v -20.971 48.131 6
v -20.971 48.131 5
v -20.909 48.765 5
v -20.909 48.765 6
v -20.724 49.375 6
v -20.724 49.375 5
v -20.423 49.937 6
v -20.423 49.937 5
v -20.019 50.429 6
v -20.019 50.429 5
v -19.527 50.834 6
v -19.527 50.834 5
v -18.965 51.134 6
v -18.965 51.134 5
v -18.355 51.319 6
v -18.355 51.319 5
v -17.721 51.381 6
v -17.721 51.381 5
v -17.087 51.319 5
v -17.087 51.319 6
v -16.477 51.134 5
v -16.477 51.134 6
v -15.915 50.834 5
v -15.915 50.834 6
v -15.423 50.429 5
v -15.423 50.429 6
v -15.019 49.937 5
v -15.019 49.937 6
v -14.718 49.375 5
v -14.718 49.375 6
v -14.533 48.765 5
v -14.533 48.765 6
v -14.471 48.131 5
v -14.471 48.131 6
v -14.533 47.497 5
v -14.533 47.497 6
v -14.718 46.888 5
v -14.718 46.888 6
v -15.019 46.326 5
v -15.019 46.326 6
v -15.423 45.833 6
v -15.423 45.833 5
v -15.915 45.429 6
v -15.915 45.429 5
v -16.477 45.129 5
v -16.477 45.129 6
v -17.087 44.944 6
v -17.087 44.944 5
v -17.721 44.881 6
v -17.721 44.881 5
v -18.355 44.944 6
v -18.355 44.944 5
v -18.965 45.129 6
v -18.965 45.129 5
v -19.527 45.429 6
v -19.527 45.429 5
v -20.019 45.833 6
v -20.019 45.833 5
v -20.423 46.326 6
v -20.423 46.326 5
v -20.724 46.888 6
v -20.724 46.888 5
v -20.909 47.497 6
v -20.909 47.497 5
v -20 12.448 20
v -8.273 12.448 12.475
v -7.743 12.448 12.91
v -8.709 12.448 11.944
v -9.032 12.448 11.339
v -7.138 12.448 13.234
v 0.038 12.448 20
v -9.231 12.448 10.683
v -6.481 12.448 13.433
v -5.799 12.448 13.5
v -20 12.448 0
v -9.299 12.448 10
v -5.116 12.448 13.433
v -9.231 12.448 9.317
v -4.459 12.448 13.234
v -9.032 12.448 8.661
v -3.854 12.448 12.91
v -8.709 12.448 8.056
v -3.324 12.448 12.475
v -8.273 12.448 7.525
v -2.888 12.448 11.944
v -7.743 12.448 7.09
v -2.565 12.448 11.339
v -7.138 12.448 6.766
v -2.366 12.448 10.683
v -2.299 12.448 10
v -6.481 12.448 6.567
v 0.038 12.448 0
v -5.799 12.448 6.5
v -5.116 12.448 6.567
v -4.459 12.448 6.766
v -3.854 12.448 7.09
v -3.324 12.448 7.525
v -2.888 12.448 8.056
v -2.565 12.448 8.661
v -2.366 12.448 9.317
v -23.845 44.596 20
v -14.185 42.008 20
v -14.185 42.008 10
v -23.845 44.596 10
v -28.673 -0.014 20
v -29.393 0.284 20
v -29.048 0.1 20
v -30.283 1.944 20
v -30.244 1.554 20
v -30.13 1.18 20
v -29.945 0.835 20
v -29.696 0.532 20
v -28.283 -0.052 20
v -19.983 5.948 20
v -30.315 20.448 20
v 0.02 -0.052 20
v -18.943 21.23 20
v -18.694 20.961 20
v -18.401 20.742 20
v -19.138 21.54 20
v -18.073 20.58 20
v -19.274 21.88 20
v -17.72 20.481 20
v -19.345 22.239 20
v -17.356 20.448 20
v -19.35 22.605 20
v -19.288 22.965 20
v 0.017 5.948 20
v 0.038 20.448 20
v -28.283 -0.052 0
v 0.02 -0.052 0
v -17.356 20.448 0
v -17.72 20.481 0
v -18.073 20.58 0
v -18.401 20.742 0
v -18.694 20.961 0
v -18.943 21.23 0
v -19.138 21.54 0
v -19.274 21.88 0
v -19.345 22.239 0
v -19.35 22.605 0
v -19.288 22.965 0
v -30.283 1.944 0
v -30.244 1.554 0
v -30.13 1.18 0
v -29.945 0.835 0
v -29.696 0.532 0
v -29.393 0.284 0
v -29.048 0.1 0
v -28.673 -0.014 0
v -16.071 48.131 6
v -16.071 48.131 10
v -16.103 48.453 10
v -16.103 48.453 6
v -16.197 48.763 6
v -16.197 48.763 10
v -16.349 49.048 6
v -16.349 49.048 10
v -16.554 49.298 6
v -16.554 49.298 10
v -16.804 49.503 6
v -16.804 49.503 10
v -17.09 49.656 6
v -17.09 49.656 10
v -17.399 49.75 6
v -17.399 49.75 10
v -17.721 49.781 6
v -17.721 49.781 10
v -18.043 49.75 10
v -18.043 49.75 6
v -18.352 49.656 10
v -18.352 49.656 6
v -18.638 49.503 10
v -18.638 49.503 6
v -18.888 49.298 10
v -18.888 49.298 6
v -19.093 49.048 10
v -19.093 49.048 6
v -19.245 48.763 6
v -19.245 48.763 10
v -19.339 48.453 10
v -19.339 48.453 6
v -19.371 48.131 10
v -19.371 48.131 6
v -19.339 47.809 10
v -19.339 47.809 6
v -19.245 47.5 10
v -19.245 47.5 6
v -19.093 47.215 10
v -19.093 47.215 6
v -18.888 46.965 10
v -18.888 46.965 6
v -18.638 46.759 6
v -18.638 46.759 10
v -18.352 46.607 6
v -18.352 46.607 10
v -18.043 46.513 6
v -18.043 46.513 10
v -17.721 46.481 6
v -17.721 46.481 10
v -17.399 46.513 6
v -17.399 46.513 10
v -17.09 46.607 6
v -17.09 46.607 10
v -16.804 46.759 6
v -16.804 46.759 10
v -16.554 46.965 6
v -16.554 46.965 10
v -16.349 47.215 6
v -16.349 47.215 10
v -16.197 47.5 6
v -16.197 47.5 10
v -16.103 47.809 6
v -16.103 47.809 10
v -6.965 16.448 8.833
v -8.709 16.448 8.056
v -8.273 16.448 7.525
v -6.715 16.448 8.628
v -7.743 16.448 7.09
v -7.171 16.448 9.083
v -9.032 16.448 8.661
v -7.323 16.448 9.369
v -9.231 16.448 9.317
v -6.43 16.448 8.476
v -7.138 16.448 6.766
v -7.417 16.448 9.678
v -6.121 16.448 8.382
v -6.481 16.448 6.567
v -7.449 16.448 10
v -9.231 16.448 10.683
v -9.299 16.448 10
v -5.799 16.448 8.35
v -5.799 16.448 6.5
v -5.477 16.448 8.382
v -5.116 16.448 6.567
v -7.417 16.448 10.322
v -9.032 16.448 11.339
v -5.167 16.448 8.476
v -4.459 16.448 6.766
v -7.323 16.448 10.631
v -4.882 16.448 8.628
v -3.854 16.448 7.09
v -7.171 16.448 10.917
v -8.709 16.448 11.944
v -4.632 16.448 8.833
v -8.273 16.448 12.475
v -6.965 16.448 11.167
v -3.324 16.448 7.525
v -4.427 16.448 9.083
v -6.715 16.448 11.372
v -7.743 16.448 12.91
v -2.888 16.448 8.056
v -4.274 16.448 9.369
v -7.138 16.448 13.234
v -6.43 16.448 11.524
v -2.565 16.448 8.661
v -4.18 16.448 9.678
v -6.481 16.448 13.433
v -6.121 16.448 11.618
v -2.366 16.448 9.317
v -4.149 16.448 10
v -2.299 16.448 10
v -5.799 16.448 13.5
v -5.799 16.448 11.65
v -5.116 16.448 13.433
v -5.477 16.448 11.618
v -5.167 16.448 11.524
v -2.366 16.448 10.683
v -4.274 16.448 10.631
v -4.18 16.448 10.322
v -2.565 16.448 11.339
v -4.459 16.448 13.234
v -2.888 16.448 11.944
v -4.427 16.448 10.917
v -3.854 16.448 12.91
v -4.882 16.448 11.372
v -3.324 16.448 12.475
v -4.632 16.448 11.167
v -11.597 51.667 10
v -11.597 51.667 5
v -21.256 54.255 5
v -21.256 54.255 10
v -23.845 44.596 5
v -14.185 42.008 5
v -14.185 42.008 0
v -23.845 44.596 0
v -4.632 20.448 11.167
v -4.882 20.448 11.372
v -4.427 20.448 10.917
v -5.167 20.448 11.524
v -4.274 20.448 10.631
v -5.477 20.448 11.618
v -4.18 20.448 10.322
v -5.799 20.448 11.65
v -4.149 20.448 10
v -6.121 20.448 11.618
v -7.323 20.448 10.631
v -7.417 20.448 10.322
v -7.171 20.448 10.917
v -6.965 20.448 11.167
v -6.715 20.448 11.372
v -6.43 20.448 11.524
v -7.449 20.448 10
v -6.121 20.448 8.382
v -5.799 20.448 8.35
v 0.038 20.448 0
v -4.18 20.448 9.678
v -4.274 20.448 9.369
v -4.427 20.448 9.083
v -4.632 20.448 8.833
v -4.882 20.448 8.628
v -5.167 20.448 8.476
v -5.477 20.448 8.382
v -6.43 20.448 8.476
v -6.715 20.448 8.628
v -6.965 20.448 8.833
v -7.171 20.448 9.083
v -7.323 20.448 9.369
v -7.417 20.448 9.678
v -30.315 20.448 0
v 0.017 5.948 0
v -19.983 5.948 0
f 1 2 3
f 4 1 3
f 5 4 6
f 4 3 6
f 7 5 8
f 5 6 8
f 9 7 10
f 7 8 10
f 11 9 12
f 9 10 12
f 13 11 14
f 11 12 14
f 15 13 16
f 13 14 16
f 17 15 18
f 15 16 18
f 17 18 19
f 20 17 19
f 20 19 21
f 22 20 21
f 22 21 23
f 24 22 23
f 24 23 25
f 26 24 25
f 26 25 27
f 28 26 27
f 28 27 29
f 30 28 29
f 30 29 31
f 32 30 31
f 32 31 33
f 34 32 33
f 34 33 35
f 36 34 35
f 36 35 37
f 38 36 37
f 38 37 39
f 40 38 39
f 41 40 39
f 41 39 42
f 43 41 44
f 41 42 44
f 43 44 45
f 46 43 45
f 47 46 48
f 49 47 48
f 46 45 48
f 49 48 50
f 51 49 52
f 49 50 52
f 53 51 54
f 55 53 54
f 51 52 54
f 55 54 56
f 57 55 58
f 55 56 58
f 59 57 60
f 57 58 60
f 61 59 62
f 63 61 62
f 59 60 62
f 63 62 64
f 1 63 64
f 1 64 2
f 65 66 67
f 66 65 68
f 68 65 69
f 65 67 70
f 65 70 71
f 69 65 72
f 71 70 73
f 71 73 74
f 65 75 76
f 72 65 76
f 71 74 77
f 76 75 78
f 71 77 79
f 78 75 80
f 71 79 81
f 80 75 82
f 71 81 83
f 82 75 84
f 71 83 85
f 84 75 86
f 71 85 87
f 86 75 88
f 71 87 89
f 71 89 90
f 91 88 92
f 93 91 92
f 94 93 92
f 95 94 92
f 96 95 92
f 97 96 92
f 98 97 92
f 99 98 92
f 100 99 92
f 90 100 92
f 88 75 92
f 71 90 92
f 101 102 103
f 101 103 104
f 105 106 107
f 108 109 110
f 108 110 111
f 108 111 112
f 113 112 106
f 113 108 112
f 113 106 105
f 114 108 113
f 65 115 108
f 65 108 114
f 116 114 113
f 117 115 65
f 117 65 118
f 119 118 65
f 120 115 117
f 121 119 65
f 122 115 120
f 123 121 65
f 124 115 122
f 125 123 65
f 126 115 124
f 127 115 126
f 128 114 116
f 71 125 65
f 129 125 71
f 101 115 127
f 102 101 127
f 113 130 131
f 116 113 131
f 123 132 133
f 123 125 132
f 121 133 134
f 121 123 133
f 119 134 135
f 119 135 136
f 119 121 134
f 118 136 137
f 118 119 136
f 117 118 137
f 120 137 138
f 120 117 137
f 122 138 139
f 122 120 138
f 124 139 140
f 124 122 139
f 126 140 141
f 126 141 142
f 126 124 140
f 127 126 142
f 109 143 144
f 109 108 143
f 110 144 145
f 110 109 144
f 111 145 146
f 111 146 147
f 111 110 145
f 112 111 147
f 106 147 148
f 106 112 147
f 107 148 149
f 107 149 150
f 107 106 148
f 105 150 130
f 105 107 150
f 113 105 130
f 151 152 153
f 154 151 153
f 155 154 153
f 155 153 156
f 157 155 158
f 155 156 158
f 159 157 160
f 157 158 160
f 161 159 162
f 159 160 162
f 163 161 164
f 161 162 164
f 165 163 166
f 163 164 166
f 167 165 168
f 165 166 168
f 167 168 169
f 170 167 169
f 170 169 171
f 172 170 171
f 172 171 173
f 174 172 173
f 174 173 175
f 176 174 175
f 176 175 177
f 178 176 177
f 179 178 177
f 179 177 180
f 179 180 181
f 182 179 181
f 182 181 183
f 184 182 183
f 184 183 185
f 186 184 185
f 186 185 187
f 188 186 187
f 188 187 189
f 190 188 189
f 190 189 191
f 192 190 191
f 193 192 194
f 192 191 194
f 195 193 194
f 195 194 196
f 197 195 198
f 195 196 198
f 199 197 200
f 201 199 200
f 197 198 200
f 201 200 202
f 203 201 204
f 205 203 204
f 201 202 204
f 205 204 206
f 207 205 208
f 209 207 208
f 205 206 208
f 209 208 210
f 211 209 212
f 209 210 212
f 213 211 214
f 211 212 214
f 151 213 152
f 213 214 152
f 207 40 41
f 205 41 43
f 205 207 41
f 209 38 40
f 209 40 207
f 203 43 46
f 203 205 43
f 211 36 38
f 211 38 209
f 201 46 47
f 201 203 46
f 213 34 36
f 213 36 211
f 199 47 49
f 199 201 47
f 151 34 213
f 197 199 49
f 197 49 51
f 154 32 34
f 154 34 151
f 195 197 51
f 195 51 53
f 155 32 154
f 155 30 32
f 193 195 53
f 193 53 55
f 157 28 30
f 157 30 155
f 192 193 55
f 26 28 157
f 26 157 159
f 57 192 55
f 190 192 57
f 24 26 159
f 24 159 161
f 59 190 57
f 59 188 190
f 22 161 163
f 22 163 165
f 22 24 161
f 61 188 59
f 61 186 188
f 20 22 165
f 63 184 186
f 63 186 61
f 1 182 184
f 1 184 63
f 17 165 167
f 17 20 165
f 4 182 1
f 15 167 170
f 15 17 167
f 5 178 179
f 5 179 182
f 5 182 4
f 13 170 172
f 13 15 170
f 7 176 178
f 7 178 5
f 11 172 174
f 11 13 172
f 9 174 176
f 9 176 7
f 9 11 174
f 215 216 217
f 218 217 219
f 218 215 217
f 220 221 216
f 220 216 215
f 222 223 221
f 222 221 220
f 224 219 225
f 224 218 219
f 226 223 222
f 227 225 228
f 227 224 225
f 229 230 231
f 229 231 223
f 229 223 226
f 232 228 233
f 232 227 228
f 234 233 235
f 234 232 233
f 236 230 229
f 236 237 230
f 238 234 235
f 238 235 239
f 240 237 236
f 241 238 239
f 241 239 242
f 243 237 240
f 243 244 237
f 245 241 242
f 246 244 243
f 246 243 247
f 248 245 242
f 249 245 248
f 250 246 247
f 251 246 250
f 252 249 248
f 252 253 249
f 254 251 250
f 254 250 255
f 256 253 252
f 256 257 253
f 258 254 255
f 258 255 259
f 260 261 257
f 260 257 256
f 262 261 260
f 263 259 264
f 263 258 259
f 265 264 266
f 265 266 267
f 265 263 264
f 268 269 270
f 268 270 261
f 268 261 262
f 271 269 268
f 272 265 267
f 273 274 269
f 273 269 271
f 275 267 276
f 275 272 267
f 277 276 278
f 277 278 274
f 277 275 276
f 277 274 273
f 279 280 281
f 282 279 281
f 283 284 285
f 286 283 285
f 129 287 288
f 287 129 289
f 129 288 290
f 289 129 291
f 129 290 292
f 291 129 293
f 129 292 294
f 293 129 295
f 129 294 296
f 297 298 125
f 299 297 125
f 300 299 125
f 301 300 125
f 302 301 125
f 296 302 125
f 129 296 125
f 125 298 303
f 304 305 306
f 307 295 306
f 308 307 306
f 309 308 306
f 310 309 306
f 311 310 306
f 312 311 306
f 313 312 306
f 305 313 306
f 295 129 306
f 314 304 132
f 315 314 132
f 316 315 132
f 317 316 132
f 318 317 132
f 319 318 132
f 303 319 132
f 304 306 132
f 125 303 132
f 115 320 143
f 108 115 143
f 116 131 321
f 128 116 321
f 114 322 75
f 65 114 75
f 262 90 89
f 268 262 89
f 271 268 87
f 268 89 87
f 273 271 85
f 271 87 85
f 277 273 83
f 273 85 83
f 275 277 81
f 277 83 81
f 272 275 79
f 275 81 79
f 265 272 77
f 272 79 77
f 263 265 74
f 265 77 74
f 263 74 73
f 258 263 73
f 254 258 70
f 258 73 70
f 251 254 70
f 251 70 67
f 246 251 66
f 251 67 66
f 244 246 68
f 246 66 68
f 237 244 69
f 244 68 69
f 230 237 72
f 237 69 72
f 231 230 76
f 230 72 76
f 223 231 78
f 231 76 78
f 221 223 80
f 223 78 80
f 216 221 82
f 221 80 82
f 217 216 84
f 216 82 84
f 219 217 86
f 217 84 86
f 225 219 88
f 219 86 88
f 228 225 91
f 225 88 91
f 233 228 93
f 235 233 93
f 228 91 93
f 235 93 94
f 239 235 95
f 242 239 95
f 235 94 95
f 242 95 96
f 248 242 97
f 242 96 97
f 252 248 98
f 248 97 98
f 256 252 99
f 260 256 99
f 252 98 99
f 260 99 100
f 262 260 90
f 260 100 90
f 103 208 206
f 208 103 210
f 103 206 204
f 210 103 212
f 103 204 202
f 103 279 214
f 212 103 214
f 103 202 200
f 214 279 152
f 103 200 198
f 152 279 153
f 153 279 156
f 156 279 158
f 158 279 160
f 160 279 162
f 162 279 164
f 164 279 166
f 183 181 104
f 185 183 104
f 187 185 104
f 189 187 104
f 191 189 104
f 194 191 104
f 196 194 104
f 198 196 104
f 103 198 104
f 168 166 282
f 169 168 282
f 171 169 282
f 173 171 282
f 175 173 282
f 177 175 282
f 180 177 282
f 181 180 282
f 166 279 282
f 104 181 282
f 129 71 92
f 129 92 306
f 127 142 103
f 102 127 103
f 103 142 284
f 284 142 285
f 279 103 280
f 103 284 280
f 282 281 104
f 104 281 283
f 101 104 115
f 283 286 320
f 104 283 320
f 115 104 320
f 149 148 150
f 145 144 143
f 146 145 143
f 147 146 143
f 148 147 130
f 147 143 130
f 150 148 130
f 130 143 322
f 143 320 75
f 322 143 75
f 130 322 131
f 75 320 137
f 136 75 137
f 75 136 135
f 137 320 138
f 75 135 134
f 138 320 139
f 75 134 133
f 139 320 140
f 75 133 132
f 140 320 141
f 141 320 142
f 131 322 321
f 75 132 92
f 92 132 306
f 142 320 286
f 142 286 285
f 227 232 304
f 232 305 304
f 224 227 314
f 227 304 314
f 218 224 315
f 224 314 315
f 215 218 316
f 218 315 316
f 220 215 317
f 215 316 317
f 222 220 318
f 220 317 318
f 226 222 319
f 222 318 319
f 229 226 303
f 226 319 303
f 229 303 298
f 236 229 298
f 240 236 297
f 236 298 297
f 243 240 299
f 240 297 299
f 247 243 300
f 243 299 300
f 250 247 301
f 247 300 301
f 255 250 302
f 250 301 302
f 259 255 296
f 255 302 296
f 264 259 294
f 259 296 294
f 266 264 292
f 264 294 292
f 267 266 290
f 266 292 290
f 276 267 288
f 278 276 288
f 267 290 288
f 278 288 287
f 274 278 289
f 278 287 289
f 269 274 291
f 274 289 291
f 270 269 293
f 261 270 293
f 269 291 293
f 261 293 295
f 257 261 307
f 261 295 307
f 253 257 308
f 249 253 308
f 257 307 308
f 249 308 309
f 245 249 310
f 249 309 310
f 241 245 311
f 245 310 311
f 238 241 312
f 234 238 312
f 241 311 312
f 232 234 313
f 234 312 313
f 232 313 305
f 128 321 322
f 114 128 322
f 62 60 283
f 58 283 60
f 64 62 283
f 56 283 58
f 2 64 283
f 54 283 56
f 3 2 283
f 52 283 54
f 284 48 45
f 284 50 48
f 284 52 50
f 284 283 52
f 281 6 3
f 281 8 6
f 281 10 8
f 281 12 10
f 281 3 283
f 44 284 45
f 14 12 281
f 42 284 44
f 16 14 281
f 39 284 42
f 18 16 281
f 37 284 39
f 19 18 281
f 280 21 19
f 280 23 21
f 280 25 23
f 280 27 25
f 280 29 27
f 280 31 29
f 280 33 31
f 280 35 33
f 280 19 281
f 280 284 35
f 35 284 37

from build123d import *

# Parameters (mm, degrees)
EXTRUDE_1_DEPTH        = 20
FILLET_1_R             = 2
FILLET_2_R             = 2
SKETCH_30_W            = 1.65
SKETCH_30_H            = 8
SKETCH_31_R            = 3.5
CUT_EXTRUDE_1_DEPTH    = 4
CUT_EXTRUDE_2_DEPTH    = 10
SKETCH_34_R            = 3.25
CUT_EXTRUDE_3_DEPTH    = 6
HOLE_WIZARD_M4_2_D     = 3.3
HOLE_WIZARD_M4_2_DEPTH = 4
SKETCH_38_W            = 5
SKETCH_38_H            = 10
CUT_EXTRUDE_4_DEPTH    = 11


with BuildPart() as part:
    # 草图1 → 凸台-拉伸1 (new body)
    with BuildSketch(Plane.XY):
        Polygon((0.020144186, -0.052366179), (0.016918395, 5.947632954), (-19.983081605, 5.947632954), (-20.000068427, 12.447632954), (0.03759791, 12.447632954), (0.03759791, 20.447632954), (-19.96240209, 20.447632954), (-11.597239053, 51.666846423), (-21.256497316, 54.255036874), (-30.315163894, 20.447632954), (-30.279663837, -0.052366179), align=None)
    extrude(amount=EXTRUDE_1_DEPTH)

    # 圆角1
    fillet_1_edges = [part.edges().sort_by_distance(p)[0] for p in [
        (-19.96240209, 20.447632954, 10),
    ]]
    fillet(fillet_1_edges, radius=FILLET_1_R)

    # 圆角2
    fillet_2_edges = [part.edges().sort_by_distance(p)[0] for p in [
        (-30.279663837, -0.052366179, 10),
    ]]
    fillet(fillet_2_edges, radius=FILLET_2_R)

    # 草图30 → M4 螺纹孔的螺纹孔钻头1 (revolve, cut)
    with BuildSketch(Plane(origin=(-5.798619526, 12.447632954, 10), x_dir=(0, 0, -1), z_dir=(1, 0, 0))):
        with Locations((0.825, 4)):
            Rectangle(SKETCH_30_W, SKETCH_30_H)
    revolve(axis=Axis((-5.798619526, 6.097632954, 10), (0, 1, 0)), mode=Mode.SUBTRACT)

    # 草图31 → 切除-拉伸1 (cut)
    with BuildSketch(Plane.XZ.offset(-12.447632954)):
        with Locations((-5.798619526, 10)):
            Circle(SKETCH_31_R)
    extrude(amount=-CUT_EXTRUDE_1_DEPTH, mode=Mode.SUBTRACT)

    # 草图33 → 切除-拉伸2 (cut)
    with BuildSketch(Plane.XY.offset(20)):
        Polygon((-21.256497316, 54.255036874), (-11.597239053, 51.666846423), (-14.185429504, 42.00758816), (-23.844687767, 44.595778611), align=None)
    extrude(amount=-CUT_EXTRUDE_2_DEPTH, mode=Mode.SUBTRACT)

    # 草图34 → 切除-拉伸3 (cut)
    with BuildSketch(Plane(origin=(0, 0, 0), x_dir=(-1, 0, 0), z_dir=(0, 0, -1))):
        with Locations((17.72096341, 48.131312517)):
            Circle(SKETCH_34_R)
    extrude(amount=-CUT_EXTRUDE_3_DEPTH, mode=Mode.SUBTRACT)

    # M4 螺纹孔的螺纹孔钻头2
    with Locations(Plane(origin=(0, 0, 6), x_dir=(-1, 0, 0), z_dir=(0, 0, -1))):
        with Locations((17.72096341, 48.131312517)):
            Hole(HOLE_WIZARD_M4_2_D / 2, depth=HOLE_WIZARD_M4_2_DEPTH)

    # 草图38 → 切除-拉伸4 (cut)
    with BuildSketch(Plane(origin=(-23.737082949, 6.360332207, 0), x_dir=(0, 0, -1), z_dir=(0.965925826, -0.258819045, 0))):
        with Locations((-2.5, 41.904754985)):
            Rectangle(SKETCH_38_W, SKETCH_38_H)
    extrude(amount=-CUT_EXTRUDE_4_DEPTH, mode=Mode.SUBTRACT)


solid = part.part
